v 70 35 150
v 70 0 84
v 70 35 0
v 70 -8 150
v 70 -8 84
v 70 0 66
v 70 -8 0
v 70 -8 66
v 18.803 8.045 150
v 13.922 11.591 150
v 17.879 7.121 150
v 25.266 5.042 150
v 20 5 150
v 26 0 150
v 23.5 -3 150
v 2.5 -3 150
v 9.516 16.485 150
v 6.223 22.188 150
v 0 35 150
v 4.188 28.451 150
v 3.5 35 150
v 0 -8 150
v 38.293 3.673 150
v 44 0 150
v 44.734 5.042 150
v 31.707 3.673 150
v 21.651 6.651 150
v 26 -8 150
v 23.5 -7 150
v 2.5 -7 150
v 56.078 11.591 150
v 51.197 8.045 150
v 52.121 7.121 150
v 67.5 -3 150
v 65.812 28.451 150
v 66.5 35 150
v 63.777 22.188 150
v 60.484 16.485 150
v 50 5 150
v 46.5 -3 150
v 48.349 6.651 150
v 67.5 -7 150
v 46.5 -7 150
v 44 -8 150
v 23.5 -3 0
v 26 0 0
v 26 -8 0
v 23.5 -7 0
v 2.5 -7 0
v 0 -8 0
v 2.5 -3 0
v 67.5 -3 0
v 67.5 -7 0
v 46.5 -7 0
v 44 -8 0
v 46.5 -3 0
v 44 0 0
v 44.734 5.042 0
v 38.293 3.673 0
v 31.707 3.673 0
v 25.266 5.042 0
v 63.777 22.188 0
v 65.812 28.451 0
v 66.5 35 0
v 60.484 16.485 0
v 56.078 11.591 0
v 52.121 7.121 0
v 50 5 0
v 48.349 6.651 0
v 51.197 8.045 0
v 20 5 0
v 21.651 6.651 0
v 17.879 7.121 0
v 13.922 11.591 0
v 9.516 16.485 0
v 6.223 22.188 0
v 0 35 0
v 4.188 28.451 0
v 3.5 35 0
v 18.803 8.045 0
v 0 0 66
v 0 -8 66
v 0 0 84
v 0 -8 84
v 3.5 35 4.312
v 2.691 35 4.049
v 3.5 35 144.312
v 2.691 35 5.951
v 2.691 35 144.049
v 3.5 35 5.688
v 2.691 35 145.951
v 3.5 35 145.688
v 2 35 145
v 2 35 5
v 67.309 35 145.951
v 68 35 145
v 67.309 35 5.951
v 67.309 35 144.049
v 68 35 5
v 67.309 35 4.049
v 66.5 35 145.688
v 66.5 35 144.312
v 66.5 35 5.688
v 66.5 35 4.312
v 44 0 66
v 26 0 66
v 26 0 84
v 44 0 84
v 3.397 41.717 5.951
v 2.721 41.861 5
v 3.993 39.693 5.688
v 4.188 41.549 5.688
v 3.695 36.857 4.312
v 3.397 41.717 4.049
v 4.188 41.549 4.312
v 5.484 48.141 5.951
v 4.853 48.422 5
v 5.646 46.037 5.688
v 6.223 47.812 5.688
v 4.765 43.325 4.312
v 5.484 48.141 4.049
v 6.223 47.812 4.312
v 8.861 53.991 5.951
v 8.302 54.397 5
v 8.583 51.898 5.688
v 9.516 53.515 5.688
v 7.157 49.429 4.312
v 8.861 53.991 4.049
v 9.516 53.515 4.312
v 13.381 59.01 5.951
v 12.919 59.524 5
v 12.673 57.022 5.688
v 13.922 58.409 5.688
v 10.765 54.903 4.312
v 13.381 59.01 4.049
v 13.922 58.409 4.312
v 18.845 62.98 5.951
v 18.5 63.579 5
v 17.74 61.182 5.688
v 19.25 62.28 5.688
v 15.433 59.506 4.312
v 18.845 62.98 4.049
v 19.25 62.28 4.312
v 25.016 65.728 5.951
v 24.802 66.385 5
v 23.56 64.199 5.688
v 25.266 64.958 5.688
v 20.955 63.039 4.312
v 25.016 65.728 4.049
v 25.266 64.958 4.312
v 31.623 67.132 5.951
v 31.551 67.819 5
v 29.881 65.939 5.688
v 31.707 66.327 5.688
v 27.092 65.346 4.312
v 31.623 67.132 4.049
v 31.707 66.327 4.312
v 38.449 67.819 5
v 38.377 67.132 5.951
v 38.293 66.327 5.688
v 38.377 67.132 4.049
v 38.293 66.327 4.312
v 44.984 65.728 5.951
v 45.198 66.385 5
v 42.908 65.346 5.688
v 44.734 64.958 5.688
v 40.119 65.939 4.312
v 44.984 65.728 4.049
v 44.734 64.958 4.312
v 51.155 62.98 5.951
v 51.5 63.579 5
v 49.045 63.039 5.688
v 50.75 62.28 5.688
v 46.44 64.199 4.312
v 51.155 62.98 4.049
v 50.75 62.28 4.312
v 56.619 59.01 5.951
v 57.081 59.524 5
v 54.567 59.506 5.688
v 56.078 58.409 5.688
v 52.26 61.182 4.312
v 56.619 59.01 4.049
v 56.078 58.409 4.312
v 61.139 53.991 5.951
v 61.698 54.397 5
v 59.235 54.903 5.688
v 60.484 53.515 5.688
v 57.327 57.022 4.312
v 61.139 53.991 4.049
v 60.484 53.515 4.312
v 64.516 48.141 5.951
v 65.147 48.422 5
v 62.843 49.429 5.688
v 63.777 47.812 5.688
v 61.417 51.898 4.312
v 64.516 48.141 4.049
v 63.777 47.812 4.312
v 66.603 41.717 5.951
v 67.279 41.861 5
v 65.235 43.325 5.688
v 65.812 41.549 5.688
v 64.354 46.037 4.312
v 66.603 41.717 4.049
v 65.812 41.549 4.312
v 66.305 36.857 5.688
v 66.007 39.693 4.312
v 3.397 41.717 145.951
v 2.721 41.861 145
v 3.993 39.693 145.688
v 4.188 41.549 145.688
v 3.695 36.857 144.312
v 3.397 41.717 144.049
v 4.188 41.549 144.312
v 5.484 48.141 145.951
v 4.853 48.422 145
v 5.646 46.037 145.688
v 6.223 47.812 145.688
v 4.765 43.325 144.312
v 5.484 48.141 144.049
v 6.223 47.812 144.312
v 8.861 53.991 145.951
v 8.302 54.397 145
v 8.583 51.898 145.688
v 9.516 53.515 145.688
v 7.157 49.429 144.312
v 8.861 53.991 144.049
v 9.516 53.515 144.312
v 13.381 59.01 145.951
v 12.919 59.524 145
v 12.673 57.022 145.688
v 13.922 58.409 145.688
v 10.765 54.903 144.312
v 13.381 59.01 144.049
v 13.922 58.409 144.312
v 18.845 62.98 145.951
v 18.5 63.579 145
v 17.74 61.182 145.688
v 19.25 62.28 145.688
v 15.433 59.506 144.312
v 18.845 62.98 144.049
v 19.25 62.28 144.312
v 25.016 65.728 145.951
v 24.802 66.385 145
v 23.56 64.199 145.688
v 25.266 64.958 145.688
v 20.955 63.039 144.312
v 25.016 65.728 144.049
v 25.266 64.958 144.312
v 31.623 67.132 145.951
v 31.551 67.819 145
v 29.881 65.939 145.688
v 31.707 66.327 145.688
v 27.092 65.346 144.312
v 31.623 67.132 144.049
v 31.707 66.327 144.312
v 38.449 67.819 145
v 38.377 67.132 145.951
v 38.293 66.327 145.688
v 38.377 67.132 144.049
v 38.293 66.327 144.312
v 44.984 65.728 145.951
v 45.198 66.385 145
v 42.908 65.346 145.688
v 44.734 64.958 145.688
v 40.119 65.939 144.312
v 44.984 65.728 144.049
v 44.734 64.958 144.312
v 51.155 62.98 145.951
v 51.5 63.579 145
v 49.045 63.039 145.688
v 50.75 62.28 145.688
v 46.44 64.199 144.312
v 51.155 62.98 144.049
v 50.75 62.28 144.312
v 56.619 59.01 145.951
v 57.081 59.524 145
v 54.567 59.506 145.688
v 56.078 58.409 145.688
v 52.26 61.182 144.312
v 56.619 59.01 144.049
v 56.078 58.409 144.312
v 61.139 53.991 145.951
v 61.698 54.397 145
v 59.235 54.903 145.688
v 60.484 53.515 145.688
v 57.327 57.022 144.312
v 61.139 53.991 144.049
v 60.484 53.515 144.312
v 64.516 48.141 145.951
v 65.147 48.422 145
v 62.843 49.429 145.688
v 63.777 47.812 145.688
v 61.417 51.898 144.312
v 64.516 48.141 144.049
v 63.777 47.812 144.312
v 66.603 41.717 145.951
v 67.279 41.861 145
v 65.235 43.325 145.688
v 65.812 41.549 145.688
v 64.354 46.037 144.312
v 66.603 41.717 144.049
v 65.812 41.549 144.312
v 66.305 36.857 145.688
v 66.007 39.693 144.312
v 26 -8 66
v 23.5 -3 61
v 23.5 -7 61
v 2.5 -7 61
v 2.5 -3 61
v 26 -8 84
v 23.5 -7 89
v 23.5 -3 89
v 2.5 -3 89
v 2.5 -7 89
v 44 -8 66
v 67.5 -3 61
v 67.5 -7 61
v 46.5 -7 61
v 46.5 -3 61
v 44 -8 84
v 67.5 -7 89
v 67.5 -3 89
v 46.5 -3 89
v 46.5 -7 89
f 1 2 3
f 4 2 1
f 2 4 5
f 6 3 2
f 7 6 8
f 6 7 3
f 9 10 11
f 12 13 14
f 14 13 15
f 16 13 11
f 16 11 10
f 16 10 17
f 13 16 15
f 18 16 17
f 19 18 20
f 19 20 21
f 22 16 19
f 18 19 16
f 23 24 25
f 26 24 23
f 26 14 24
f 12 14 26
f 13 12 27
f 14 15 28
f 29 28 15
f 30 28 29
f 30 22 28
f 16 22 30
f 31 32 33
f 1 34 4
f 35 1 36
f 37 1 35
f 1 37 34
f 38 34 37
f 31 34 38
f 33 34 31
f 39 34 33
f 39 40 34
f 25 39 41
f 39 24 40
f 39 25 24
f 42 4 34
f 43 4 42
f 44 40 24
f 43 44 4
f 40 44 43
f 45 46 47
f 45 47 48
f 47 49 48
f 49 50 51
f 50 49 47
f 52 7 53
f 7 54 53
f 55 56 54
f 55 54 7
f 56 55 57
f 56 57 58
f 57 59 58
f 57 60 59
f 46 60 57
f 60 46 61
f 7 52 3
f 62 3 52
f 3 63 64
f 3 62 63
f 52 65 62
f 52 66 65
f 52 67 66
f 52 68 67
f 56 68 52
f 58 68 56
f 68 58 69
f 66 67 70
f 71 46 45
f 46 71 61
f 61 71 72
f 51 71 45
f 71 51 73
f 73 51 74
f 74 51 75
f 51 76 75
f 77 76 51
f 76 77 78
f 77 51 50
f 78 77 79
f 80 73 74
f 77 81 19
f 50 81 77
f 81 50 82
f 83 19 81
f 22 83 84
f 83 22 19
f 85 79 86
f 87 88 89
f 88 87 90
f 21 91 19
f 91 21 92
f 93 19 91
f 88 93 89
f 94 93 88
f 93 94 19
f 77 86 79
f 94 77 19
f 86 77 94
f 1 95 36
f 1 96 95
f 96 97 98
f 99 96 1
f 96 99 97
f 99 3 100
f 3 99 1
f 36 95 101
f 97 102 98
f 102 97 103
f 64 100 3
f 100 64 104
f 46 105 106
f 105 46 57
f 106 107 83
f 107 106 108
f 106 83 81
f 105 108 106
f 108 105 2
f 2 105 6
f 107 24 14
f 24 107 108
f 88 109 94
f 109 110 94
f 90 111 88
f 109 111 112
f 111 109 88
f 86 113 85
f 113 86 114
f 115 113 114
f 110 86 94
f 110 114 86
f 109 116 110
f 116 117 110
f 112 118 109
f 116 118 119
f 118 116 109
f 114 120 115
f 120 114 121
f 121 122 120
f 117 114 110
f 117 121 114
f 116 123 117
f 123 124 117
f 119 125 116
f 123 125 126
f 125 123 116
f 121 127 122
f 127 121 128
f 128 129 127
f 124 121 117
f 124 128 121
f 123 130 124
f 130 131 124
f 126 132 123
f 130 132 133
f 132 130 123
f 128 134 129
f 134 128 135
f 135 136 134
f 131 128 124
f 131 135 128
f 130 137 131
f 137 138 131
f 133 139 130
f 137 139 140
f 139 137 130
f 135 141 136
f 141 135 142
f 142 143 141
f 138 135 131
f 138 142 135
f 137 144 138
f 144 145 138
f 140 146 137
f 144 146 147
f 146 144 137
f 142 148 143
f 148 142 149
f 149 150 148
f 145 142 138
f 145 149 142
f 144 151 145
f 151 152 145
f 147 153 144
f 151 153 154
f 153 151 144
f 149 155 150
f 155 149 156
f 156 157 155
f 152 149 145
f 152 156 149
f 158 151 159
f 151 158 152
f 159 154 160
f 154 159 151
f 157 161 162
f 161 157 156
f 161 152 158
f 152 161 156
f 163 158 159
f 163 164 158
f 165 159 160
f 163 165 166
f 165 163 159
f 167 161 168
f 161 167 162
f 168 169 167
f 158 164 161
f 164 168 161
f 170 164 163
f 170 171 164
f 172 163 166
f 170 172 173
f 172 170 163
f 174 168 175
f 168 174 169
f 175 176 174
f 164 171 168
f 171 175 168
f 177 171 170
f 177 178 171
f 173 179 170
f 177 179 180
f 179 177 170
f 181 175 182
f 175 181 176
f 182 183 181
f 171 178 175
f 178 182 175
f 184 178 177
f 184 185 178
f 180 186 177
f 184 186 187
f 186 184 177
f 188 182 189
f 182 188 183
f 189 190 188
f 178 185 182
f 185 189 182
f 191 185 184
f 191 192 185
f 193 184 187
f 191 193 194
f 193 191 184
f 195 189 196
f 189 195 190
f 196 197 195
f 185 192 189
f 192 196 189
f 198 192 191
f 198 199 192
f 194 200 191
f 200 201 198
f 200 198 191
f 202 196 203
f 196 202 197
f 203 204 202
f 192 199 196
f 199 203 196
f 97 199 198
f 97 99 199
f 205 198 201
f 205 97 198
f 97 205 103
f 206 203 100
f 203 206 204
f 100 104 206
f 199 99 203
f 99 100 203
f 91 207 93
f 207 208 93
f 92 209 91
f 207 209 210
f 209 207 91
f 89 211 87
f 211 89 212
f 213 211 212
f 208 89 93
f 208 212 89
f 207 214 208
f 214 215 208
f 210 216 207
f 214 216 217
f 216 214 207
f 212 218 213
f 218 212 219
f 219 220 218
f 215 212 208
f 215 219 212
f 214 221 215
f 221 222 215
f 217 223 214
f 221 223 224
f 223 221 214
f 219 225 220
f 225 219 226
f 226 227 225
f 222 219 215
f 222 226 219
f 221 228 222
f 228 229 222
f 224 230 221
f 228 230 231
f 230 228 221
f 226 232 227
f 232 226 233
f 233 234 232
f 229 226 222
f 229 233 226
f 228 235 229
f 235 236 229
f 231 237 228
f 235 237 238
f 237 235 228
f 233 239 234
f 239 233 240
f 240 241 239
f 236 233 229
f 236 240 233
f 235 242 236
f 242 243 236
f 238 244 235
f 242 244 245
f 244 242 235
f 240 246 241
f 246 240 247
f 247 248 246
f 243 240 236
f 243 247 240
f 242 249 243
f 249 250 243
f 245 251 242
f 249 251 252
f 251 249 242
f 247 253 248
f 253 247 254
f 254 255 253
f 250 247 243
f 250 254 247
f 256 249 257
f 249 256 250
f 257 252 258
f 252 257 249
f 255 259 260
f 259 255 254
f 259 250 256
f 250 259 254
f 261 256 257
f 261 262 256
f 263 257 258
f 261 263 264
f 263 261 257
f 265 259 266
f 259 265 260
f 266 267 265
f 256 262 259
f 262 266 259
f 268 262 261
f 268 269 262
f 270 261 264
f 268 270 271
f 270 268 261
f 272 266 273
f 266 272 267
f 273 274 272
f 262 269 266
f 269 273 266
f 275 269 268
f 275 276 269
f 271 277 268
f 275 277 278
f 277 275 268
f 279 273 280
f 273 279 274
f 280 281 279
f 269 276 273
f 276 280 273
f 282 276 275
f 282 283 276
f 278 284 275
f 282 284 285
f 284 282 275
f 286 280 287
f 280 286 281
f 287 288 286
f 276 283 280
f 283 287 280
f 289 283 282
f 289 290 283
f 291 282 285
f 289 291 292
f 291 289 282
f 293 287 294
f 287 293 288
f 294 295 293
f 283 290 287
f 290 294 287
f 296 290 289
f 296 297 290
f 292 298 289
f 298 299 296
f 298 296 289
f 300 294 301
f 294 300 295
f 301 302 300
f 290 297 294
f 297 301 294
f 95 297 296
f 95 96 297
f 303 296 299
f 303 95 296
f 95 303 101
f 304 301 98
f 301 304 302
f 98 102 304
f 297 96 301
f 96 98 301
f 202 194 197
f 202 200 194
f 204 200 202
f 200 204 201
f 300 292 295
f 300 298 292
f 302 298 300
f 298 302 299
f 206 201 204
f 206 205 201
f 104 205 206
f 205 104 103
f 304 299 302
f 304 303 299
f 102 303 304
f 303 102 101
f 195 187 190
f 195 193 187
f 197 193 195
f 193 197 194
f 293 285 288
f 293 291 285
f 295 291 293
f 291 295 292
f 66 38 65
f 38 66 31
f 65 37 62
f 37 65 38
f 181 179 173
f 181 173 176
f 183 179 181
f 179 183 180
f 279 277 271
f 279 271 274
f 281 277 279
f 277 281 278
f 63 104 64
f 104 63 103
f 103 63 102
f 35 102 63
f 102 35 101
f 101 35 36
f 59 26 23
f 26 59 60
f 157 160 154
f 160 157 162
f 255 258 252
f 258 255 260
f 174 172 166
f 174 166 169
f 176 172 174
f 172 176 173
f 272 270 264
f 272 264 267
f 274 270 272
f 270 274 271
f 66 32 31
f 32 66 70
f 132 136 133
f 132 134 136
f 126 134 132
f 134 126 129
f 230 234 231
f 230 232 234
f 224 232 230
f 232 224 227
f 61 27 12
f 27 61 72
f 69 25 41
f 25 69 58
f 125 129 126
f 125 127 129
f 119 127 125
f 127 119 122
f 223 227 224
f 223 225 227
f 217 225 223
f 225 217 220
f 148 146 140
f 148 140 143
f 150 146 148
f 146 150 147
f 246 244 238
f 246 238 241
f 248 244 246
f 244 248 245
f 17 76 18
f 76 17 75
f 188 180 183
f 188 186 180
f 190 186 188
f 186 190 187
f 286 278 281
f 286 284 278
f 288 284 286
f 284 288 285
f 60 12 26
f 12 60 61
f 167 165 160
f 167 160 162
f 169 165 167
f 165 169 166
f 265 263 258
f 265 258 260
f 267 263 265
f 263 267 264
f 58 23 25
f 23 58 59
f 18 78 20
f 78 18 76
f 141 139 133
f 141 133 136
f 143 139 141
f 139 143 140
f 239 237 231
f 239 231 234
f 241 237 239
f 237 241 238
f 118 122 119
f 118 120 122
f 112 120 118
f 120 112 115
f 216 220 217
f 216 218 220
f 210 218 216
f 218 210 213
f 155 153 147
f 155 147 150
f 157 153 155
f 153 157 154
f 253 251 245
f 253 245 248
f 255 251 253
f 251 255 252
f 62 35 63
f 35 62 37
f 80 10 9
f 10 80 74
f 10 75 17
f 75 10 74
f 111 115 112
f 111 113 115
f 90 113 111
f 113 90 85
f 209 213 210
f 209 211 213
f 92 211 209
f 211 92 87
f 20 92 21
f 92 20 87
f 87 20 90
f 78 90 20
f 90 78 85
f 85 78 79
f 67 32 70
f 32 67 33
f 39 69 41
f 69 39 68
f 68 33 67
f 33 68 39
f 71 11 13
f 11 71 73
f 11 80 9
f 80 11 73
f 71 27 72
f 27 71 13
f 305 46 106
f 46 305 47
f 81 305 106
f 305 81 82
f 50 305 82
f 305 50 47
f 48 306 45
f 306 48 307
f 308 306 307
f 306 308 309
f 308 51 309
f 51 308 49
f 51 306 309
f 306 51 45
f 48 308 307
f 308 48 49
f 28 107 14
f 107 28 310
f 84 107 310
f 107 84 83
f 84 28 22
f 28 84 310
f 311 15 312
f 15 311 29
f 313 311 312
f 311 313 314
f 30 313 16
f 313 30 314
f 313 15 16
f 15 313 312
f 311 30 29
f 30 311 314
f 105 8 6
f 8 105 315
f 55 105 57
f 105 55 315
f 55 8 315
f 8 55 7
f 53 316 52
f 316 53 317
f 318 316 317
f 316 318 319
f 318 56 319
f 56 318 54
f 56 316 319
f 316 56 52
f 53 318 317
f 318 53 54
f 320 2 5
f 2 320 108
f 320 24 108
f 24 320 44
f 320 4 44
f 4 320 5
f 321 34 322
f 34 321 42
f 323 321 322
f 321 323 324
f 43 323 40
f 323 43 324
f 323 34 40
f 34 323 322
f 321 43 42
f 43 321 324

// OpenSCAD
// designed to cradle a Singularity Computers Protium reservoir. the relevant tube
// diameter is 60mm: https://singularitycomputers.com/shop/watercooling/protium/protium-reservoir-200mm-frosted-acrylic-black/
// we leave space underneath for electronics. we put magnets in the feet to bind
// to the MORA3. the MORA3's center is 70mm wide.
// FIXME cut holes to let light through?
// FIXME grooves for LEDs?

d = 60 + 3; // 3mm gap for tape/LEDs
h = 150; // it's actually 200, but we don't want the entire length
e = 70 - d;

// magnets are 60x10x2. we have them in pairs (20mm).
magh = 60 + 1; // 1mm gap
magw = 20 + 1; // 1mm gap
magl = 3 + 1; // 1mm gap

sloth = 150;
slotw = 3; // 1mm wide + gap
slotl = 3;

module ring(){
	rotate_extrude(convexity = 10){
		translate([(d + e) / 2 - 3, 0, 0]){
			circle(r = 1, $fn = 5);
		}
	}
}
		
// we want a big cuboid with a cylinder removed, and two slots for LEDs
difference(){
	union(){
		cube([d + e, (d + e) / 2, h]);
		translate([(d + e) / 2, 35, 5]){
			ring();
		}
		translate([(d + e) / 2, 35, h - 5]){
			ring();
		}
	}
	union(){
		translate([(d + e) / 2, (d +e) / 2, 0]){
			cylinder(h, d / 2, d / 2);
		}
	  translate([50, 5, 0]){
			rotate([0, 0, 45]){
				cube([slotw, slotl, sloth]);
			}
		}
    translate([20, 5, 0]){
   		rotate([0, 0, 45]){
				cube([slotw, slotl, sloth]);
			}
		}
	}
}


padh = magh + 5;
padl = magl + 4;
padw = magw + 5;

// a stand on the bottom, with a slot to contain two magnets.
module padbottom(z){
	difference(){
		cube([padw, padl, padh]);
		if(z){
			translate([(padw - magw) / 2, (padl - magl) / 2 - 1, 0]){
				cube([magw, magl, magh]);
			}
		}else{
			translate([(padw - magw) / 2, (padl - magl) / 2 - 1, (padh - magh)]){
				cube([magw, magl, magh]);
			}
		}
	}
}

for(x = [0, d + e - padw])
	for(z = [0, h - padh])
		translate([x, -padl, z]){
			padbottom(z == 0);
		}
		
